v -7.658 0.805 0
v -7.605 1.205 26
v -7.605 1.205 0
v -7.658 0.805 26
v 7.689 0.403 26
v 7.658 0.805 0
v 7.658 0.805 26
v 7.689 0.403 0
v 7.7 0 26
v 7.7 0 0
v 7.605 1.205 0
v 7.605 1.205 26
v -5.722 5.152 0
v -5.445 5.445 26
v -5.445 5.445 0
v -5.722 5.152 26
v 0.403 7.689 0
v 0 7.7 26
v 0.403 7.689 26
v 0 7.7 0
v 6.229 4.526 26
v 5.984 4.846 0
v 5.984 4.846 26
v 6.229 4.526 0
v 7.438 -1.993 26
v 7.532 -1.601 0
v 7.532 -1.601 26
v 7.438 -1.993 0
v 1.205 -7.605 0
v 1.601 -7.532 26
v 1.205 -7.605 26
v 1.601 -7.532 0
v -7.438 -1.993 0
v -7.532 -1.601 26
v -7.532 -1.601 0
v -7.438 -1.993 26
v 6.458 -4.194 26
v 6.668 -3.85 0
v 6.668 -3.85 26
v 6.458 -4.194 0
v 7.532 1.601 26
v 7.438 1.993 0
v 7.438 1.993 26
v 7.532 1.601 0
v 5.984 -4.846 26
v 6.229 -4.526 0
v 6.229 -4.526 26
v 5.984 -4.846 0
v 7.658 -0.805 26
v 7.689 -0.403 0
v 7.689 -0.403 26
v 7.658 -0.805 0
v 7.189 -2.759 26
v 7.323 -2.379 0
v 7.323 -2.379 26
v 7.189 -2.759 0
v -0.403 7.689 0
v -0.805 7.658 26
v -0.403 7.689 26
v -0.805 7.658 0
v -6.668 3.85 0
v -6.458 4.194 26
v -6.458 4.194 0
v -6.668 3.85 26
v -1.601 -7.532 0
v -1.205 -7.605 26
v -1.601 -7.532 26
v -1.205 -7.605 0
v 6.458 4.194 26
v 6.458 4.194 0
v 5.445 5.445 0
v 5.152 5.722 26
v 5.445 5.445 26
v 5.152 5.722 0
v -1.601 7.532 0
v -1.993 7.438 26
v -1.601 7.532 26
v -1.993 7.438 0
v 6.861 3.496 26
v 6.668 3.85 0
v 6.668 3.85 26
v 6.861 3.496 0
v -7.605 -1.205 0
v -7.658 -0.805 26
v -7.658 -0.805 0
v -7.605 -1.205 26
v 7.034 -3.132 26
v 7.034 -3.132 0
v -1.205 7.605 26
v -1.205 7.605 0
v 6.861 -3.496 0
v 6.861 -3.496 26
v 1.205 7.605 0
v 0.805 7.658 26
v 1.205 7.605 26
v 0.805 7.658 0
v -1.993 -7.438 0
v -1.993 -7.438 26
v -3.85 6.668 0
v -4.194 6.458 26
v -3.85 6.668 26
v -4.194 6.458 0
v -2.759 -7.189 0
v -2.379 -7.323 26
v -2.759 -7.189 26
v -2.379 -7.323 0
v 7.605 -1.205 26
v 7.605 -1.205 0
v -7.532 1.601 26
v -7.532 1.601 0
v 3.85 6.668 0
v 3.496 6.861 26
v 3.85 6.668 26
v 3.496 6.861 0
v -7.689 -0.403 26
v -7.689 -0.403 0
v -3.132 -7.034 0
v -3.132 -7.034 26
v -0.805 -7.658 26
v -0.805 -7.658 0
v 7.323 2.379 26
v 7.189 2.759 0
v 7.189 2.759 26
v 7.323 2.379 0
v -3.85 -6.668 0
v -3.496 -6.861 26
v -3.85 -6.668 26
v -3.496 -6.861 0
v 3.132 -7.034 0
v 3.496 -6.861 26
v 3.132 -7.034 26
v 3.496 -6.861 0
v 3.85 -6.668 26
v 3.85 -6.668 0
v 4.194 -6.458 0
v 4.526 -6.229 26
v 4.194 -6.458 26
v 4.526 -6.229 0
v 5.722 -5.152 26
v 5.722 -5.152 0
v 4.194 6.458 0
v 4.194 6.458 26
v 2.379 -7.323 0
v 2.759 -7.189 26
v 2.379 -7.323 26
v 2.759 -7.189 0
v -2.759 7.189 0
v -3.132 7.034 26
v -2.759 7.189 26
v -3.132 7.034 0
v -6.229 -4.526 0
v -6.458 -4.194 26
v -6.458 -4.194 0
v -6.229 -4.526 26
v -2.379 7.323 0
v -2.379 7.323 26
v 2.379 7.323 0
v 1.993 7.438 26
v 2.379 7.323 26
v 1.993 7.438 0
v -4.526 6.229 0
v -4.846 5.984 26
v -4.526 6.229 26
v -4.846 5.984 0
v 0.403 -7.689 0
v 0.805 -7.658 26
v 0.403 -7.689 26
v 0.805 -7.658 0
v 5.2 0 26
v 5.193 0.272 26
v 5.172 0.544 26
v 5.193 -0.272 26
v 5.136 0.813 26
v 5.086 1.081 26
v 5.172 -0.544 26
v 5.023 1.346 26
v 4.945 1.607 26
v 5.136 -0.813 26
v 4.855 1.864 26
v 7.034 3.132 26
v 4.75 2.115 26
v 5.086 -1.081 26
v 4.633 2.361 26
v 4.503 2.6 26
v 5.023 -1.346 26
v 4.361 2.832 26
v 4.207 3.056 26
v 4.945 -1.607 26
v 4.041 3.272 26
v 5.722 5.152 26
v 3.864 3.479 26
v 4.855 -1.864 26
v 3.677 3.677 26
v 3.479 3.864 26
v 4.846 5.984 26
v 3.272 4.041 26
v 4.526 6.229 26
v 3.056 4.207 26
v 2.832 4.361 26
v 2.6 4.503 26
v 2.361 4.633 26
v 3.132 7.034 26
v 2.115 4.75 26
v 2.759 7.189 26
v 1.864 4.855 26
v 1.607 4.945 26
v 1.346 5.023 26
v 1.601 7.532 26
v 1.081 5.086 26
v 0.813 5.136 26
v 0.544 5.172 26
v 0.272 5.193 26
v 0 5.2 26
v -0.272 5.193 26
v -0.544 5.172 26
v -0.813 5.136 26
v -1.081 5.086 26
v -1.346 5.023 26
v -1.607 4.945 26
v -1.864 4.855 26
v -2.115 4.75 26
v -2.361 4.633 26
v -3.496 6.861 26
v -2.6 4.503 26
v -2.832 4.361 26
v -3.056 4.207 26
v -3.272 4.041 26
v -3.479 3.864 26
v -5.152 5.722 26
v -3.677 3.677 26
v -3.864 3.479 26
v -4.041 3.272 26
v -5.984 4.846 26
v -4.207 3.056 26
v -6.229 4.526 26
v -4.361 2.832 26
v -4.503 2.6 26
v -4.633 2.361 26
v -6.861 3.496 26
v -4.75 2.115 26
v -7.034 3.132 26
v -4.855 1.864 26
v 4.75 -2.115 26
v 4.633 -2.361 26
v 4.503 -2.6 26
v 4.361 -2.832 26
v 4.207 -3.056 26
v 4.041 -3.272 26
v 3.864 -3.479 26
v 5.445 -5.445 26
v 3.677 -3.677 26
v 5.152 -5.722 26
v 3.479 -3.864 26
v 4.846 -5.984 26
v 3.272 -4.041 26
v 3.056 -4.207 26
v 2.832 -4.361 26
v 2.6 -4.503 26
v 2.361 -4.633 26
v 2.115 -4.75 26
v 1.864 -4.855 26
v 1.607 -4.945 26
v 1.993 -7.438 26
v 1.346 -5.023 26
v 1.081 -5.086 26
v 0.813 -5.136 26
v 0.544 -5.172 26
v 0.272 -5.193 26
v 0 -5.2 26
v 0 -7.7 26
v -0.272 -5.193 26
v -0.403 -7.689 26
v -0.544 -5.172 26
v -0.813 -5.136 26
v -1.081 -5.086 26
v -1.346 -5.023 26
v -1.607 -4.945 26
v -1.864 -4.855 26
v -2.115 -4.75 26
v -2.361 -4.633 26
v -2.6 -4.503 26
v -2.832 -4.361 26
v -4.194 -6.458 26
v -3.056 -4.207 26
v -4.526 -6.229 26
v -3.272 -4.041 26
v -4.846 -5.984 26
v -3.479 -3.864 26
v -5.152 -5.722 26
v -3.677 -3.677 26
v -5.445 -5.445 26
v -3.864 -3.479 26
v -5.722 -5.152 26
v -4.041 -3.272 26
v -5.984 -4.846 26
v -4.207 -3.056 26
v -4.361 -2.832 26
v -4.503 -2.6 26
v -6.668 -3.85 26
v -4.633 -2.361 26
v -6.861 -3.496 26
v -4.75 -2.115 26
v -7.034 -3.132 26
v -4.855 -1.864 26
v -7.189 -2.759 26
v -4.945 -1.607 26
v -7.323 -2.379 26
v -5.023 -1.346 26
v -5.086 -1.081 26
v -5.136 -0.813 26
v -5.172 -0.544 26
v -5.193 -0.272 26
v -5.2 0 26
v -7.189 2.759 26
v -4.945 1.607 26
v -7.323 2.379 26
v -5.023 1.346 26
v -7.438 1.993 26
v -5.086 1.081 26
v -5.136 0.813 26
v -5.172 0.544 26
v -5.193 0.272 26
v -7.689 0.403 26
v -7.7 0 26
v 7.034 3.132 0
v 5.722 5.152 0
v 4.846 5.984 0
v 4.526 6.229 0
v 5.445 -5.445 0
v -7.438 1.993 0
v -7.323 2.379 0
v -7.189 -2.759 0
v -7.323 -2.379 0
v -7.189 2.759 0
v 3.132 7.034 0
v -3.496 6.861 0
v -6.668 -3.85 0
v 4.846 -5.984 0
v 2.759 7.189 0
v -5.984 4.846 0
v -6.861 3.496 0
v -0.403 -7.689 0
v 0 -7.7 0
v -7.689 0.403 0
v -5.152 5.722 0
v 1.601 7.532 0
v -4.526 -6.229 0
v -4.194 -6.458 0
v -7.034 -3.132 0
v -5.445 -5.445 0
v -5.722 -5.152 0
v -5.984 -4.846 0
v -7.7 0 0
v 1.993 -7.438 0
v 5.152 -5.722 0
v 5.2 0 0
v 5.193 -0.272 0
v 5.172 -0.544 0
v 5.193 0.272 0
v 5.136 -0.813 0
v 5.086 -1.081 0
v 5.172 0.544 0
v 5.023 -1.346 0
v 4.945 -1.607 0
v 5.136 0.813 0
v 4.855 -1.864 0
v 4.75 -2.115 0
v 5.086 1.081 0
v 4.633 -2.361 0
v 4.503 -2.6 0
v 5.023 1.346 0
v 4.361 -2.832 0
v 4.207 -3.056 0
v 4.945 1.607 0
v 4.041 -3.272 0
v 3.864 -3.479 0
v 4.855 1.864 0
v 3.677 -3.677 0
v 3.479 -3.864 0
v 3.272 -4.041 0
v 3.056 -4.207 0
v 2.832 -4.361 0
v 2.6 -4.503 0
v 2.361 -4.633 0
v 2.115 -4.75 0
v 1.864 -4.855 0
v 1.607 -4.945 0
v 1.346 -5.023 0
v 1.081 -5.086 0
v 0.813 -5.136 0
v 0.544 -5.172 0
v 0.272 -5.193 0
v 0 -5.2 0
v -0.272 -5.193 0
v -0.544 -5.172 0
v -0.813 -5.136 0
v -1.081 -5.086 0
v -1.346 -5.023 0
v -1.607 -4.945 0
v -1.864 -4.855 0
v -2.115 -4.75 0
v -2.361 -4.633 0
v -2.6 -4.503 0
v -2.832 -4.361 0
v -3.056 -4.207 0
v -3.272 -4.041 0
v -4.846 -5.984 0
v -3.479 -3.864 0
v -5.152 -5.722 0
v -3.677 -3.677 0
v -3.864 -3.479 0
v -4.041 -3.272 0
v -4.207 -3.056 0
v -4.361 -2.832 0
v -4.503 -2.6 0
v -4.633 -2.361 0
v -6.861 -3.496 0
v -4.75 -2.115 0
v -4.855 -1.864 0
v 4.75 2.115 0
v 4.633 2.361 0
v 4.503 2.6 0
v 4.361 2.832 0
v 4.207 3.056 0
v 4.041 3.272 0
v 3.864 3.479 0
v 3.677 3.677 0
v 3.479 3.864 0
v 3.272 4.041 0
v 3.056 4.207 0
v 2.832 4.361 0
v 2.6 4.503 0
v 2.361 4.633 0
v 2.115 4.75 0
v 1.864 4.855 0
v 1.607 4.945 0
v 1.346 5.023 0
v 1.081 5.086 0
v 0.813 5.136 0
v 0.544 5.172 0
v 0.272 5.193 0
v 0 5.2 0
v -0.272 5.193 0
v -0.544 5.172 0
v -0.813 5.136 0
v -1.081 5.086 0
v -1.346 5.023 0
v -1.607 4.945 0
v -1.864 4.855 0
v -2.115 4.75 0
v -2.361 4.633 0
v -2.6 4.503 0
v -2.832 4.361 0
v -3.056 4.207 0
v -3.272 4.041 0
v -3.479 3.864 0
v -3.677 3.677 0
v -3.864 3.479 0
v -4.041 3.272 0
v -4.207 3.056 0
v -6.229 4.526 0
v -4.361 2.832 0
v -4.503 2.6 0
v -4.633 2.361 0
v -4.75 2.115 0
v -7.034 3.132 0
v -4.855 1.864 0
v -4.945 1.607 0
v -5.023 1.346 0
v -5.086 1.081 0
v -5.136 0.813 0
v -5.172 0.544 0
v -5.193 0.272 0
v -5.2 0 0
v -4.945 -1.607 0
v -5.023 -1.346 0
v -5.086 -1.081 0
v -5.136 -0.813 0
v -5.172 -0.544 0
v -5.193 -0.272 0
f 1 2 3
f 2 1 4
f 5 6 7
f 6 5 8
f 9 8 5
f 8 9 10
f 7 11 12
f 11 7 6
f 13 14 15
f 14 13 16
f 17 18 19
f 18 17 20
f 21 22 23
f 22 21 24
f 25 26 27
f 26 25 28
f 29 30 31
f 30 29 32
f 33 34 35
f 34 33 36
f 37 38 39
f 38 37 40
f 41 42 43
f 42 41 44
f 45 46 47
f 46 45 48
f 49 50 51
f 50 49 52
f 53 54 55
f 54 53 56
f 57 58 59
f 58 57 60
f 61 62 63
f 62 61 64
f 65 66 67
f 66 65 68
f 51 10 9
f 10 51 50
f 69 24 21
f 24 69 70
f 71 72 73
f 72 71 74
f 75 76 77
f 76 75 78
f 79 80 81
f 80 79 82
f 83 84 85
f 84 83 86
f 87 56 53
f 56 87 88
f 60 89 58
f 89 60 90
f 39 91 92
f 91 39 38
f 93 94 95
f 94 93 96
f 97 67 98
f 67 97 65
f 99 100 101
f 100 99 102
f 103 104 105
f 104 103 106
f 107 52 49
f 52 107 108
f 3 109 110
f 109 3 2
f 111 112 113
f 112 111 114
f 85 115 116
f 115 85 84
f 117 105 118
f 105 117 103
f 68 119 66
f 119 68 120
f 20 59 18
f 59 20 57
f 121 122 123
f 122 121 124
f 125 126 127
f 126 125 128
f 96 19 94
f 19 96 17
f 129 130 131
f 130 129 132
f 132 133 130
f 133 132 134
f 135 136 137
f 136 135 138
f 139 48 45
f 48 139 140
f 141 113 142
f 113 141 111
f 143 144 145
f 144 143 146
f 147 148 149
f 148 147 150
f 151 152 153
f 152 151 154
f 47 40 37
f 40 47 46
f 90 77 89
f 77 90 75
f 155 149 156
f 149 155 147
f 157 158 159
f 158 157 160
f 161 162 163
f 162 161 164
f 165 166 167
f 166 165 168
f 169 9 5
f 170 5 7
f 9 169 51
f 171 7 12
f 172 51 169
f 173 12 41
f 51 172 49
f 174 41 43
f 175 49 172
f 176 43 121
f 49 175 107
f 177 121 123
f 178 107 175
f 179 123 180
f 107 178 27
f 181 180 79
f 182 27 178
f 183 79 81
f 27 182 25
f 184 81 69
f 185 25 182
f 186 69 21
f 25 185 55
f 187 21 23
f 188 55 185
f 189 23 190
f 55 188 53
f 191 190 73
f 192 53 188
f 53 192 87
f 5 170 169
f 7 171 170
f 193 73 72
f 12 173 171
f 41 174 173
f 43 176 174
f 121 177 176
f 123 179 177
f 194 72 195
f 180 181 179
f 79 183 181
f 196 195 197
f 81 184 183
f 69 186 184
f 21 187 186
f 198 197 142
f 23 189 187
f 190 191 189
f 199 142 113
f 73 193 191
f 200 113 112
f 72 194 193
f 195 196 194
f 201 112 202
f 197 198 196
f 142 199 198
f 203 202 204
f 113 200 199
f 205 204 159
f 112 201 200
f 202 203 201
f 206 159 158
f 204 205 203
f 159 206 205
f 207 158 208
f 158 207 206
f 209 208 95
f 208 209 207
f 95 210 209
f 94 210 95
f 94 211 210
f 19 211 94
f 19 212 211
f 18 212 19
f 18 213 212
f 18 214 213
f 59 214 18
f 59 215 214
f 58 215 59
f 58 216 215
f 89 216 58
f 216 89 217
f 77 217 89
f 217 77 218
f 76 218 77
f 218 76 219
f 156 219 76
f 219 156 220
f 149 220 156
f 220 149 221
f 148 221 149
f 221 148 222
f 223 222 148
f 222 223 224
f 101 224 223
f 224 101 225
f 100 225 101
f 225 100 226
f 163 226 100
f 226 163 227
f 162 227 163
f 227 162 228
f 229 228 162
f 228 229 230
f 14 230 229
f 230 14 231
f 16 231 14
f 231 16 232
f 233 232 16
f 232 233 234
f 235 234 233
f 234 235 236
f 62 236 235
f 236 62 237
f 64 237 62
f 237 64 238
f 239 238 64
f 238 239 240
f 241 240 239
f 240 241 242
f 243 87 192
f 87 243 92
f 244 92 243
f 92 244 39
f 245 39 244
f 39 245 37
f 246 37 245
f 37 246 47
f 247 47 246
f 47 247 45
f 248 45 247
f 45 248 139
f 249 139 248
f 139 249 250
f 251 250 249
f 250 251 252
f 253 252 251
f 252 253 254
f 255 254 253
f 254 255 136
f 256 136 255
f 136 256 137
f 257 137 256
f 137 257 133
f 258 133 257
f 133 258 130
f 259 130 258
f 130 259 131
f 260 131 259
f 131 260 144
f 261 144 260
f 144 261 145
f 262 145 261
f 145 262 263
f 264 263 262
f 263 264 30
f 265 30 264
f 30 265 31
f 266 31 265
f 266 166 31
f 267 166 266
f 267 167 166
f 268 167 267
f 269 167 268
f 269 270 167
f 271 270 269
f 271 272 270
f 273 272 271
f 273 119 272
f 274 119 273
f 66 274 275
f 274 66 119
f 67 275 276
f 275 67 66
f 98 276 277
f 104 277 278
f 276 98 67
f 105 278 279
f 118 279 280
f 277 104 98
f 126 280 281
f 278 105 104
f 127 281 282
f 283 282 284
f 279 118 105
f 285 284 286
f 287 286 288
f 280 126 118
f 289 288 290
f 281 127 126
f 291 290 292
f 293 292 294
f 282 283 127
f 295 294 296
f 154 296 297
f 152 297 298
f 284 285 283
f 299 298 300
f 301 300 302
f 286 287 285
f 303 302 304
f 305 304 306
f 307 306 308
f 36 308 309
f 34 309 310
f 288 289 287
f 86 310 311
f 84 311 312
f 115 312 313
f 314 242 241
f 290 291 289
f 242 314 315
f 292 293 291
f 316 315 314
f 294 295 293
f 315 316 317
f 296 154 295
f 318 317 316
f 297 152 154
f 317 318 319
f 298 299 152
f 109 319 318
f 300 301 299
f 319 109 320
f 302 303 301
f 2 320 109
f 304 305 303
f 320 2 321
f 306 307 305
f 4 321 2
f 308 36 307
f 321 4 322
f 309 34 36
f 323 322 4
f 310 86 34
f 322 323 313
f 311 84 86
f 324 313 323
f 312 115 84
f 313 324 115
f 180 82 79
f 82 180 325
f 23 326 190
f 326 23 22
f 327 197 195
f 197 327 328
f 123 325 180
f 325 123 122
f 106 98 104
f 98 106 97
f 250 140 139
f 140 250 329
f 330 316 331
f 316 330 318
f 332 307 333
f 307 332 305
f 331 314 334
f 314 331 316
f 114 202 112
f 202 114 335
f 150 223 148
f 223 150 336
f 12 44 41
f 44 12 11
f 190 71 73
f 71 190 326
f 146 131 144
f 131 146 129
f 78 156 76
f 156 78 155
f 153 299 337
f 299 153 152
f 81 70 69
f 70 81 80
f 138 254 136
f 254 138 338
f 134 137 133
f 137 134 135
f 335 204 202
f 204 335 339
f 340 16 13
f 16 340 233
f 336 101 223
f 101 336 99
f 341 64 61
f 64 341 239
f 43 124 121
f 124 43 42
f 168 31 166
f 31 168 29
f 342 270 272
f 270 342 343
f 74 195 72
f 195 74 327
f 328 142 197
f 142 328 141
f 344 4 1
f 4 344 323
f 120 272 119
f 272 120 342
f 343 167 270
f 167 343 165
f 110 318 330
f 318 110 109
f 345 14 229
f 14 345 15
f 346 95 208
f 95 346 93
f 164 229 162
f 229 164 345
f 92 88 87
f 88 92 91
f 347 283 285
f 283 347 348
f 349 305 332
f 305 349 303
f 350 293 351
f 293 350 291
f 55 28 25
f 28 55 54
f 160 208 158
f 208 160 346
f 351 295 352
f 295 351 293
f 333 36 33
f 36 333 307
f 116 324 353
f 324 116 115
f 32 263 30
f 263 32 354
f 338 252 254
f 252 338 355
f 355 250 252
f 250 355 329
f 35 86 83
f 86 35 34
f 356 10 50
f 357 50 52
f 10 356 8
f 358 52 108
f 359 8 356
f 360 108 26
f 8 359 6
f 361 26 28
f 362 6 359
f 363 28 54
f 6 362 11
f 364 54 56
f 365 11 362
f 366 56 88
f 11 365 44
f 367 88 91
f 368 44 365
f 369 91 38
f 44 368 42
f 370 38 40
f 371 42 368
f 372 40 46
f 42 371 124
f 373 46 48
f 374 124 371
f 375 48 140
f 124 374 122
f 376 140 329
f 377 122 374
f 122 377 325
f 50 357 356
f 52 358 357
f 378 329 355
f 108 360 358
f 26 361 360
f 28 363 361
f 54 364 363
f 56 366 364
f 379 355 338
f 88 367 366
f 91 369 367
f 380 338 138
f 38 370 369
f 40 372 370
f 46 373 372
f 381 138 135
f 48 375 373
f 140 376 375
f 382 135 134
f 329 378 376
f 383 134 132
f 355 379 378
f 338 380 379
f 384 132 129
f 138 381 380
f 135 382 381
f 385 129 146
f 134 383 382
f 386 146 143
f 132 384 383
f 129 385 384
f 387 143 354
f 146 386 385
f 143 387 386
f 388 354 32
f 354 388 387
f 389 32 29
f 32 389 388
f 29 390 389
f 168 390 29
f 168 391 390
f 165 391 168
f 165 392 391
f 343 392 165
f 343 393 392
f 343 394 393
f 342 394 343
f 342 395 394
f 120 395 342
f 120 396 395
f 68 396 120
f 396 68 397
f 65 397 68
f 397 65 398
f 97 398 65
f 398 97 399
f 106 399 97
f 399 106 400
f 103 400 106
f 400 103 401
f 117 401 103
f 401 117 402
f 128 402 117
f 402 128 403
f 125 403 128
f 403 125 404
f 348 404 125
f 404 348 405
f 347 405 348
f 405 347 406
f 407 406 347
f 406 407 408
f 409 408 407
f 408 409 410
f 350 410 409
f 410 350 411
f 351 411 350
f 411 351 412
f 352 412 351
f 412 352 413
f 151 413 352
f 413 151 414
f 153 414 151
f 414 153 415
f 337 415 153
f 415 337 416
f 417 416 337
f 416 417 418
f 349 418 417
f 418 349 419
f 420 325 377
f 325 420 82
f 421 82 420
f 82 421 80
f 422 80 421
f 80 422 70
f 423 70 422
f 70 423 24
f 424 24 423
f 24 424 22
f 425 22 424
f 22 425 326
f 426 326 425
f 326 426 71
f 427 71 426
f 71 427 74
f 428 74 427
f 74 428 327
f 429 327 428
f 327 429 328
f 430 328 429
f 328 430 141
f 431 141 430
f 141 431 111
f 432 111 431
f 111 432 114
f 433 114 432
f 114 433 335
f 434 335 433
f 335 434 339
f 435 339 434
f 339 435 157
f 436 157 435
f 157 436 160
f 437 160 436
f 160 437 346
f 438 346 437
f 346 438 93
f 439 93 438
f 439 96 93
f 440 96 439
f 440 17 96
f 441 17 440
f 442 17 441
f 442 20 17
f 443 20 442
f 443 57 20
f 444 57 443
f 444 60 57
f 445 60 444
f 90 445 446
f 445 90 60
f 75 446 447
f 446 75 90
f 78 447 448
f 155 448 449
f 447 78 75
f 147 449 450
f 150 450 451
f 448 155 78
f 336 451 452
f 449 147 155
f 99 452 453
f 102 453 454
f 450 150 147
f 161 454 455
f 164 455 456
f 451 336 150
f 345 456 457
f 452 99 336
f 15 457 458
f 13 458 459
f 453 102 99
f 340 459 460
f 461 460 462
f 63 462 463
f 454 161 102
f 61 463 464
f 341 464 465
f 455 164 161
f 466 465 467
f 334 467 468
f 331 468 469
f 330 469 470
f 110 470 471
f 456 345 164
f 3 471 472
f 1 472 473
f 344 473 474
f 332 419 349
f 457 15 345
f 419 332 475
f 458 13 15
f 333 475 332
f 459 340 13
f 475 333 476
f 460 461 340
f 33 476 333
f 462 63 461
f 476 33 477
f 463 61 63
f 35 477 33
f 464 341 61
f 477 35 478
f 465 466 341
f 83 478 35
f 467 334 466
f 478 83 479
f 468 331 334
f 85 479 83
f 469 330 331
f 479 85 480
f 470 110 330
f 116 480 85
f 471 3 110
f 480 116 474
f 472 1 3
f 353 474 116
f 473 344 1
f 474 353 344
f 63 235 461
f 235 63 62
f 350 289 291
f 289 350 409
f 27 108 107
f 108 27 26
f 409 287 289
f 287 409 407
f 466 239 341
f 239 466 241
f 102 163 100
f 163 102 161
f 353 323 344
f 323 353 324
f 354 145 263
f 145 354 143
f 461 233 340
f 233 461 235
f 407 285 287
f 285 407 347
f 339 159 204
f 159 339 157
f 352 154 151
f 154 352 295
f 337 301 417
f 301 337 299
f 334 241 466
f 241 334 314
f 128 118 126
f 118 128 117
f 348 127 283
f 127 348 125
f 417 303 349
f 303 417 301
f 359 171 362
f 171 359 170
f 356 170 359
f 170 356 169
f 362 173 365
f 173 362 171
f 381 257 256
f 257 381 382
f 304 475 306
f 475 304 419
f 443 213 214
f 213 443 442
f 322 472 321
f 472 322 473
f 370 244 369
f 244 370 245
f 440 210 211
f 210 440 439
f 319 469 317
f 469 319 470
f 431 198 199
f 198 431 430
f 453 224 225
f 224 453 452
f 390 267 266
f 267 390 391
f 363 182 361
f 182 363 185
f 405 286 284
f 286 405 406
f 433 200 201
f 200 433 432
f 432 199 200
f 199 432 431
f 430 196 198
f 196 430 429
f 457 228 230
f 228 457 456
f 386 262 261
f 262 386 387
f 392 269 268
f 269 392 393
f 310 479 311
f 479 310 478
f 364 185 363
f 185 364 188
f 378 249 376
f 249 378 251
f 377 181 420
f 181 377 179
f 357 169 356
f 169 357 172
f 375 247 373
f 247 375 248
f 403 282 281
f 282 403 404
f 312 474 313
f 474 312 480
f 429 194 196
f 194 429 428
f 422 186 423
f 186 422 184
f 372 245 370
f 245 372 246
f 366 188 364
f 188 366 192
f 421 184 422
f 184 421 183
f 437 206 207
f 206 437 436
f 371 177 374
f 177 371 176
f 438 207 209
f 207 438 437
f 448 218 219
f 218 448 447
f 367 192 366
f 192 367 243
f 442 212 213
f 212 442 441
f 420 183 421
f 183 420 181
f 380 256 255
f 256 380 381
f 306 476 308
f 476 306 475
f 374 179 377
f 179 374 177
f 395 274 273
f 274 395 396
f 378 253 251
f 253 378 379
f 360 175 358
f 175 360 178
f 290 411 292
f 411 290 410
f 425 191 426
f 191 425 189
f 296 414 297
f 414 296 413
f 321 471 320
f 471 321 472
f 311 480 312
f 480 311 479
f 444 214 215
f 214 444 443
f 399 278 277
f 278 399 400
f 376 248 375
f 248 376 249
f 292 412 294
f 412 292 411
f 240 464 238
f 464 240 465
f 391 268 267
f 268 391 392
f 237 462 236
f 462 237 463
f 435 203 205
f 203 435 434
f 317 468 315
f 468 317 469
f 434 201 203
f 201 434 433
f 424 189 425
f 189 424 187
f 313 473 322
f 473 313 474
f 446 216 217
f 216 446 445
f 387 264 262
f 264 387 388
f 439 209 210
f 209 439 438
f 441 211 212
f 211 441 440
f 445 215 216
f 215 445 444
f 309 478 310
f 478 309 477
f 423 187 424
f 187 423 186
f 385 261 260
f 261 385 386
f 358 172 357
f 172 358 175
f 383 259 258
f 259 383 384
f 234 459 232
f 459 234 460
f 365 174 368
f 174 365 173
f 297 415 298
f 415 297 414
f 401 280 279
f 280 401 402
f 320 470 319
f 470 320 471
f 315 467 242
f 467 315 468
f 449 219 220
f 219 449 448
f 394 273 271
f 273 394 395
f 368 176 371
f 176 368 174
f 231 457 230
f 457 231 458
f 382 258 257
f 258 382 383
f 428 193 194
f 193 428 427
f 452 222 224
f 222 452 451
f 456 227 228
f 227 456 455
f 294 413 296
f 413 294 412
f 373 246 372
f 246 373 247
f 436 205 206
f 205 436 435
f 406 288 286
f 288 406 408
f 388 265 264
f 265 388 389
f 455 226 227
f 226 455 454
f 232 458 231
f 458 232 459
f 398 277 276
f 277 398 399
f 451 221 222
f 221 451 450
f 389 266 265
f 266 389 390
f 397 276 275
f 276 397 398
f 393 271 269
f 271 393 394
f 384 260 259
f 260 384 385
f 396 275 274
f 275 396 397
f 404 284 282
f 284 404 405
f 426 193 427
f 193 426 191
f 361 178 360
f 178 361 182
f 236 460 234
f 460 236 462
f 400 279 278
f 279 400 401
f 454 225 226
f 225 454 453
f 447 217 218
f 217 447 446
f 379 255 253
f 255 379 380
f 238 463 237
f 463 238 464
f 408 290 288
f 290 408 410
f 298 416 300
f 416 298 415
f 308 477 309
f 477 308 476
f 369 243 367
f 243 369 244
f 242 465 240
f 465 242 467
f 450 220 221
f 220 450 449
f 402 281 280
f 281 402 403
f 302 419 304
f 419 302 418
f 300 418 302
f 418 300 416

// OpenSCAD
// file: config.scad
//General Settings
play=0.2; //to make fittings (add to some holes if nessesary)
//circle resolution 
$fa = 3;
$fs = 0.1;

aluminum = [0.9, 0.9, 0.9];
steel = [0.8, 0.8, 0.9];
wood="BurlyWood";

//Linear Guidance Settings
lg_d=70;//70  //distance      
lg_c=200;//200;  //away form center   
lg_holder_d=23;//15 //distace from holder to the mount joint  
ld_rod_d=10;

//Arms Settings
arm_n=3;
arm_d=50;//50  //distance
arm_l=300;//300; //length
arm_rod_d=5;//5  //rod diameter

//Joint Settings
joint_open_angel=120;
joint_b=16; 
joint_l=8;
joint_w=14;
joint_rh=30;
joint_hh=joint_l/sqrt(2);

//Platform
platform_c=33;//25 //mount away from center
platform_inner_r=15;
platform_outer_r=25;


//ISO/DIN Parts 
//Kugellager
kugellager_d=5+play;
kugellager_h=2.5+play;

//Mutter M2
M2_nut_d=4.38+2*play;
M2_nut_w=4+2*play;
M2_nut_h=1.6+2*play;

//Mutter M3
M3_nut_d=6.01+2*play;
M3_nut_w=5.5+2*play;
M3_nut_h=2.4+2*play;

//Mutter M4
M4_nut_d=7.66+2*play;
M4_nut_w=7+2*play;
M4_nut_h=3.2+2*play;

//LMXXUU Linear Ball Bearing
LMXXUU_d=19;
LMXXUU_l=29;

//Pully 2.5
band_w=5;
band_b=2;
band_outer_d=13;
//Ballbearing opposit for pully
band_bb_id=5;
band_bb_od=11;
band_bb_w=4;


//Nema17
nema17_od=42.3;
nema17_id=22+2*play;
nema17_screw_d=31;
nema17_l=48;
// main file
include <config.scad>

module distanceholder(h=26)
{
	difference()
	{
		cylinder(r=(ld_rod_d+2*play+5)/2,h=h);
		
		translate([0,0,-1])
			cylinder(r=(ld_rod_d+2*play)/2,h=h+2);
	}

}

distanceholder();
